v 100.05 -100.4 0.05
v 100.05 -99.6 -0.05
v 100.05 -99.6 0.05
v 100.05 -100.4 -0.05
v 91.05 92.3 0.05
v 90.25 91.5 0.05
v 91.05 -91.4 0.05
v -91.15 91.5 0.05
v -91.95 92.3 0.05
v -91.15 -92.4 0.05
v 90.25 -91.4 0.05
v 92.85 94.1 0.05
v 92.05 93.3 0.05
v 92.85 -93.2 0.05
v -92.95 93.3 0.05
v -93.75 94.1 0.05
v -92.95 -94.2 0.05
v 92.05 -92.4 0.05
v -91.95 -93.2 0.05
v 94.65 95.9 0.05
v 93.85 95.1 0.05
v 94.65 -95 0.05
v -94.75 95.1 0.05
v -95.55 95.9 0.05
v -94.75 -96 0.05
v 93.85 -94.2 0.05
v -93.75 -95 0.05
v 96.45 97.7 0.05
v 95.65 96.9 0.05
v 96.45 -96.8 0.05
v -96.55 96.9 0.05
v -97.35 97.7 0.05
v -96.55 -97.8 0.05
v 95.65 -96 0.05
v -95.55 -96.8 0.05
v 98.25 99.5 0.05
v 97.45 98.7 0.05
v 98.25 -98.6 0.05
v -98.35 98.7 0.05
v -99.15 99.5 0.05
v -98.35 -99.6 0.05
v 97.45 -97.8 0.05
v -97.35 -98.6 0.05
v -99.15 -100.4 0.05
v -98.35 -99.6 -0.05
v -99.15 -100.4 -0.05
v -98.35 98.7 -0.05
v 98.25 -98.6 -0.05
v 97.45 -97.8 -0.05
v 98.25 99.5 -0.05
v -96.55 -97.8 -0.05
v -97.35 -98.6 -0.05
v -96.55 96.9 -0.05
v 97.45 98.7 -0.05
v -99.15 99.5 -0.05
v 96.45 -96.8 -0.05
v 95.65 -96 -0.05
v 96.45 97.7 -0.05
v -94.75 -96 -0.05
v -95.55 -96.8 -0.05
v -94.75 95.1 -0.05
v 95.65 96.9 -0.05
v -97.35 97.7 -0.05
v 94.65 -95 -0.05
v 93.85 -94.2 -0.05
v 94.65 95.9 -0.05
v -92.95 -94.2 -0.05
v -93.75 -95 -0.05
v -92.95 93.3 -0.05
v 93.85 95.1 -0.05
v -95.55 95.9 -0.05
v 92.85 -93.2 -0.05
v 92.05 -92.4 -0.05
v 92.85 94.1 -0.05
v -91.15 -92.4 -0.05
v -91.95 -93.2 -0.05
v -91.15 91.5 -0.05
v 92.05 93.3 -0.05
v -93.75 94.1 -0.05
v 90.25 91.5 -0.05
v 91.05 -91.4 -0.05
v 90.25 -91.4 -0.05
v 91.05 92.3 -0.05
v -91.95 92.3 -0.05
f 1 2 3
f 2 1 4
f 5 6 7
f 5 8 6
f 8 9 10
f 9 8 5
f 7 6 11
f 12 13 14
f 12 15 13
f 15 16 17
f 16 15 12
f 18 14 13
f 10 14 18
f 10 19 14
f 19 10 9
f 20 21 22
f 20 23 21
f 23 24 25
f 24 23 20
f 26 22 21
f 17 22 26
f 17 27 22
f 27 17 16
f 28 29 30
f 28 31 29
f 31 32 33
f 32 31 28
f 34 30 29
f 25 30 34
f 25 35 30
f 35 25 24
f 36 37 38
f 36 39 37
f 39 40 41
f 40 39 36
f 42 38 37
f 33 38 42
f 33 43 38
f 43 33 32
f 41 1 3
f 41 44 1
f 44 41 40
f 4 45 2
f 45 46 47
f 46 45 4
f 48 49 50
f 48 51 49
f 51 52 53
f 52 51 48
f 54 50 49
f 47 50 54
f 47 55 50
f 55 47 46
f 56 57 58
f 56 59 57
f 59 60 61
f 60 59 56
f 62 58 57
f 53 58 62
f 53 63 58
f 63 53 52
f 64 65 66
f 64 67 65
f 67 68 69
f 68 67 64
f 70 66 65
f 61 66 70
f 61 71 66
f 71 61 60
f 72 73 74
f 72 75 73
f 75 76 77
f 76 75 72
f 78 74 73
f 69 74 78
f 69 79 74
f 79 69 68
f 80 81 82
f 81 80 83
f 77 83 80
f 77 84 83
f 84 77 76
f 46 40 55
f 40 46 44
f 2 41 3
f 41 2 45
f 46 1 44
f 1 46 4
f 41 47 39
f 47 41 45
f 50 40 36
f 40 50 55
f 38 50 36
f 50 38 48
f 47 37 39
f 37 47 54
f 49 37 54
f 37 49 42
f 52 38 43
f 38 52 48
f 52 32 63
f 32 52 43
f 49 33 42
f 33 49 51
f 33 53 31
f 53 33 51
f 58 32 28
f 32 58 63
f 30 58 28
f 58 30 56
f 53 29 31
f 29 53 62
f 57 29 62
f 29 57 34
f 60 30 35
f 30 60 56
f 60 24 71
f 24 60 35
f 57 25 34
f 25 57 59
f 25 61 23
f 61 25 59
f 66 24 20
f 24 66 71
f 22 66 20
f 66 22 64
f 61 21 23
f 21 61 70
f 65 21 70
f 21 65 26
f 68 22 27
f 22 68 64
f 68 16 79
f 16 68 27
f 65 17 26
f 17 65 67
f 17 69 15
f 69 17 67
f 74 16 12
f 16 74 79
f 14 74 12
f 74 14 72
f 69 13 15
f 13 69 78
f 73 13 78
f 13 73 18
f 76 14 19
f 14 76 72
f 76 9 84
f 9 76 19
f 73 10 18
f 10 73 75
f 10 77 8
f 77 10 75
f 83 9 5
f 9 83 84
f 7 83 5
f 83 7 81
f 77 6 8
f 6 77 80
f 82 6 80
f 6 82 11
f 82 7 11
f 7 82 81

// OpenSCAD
// spiral shape (rectangular or circular)
_bed_type = 4; // [4:rectangular, 120:circular]

// width of the bed along the x-axis
_bed_x = 200;

// width of the bed along the y-axis
_bed_y = 200;

// thickness of each printed line of the spiral
_line_width = 0.8;

// height of the spiral
_line_height = 0.1;

// distance between each loop of the spiral
_spiral_gap = 1;

// number of loops in the spiral
_loops = 5;


module make() {
//	#cube([_bed_x, _bed_y, 0.1], center=true);

	if (_bed_type == 4) {
		sqiral(_loops, _bed_x/2, _bed_y/2, _line_width, _line_height, _spiral_gap, _bed_type);
	} else {
		spiral(_loops, min(_bed_x, _bed_y)/2, _line_width, _line_height, _spiral_gap, _bed_type);
	}
}


module sqiral(revolutions, rx, ry, thickness, height, gap, resolution) {
	minr = min(rx, ry);
	revolutions = min(revolutions, floor((minr-gap)/(thickness+gap)));
	rx = rx - thickness;
	pitch = thickness + gap;

	union() {
		for (step = [0:1:revolutions * resolution - 1]) {
			assign(s = step * pitch/4) {
				if (step%2 == 0) {
					translate([(step%4) ? -pitch/4 : pitch/4, (step%4) ? ry - s : -ry + s, 0])
					cube([rx*2 - s*2 + thickness, thickness, height], center=true);
				} else {
					translate([(step%4-1) ? rx - s: -rx + s, (step%4-1) ? pitch/4 : -pitch/4, 0])
					cube([thickness, ry*2 - s*2 + thickness, height], center=true);
				}
			}
		}
	}
}

function spiralRadius(radius, angle, pitch) = radius - pitch * (angle/360);
function angleStep(step) = step * (360/_bed_type);

module spiral(revolutions, radius, thickness, height, gap, resolution) {
	revolutions = min(revolutions, floor((radius-gap)/(thickness+gap)));
	pitch = thickness + gap;
	eps = 0.01;

	union() {
		for (step = [0:1:revolutions * resolution-1]) {
			assign(startAngle = angleStep(step),
					endAngle = angleStep(step+1)) {
				assign(	r0 = spiralRadius(radius, startAngle, pitch),
						r1 = spiralRadius(radius, endAngle, pitch),
						r2 = spiralRadius(radius-thickness, endAngle, pitch),
						r3 = spiralRadius(radius-thickness, startAngle, pitch) ) {
					linear_extrude(height = height, slices = 1) {
						polygon(	points=[	[r0*sin(startAngle), r0*cos(startAngle)],
										[r1*sin(endAngle), r1*cos(endAngle)],
										[r2*sin(endAngle+eps), r2*cos(endAngle+eps)],
										[r3*sin(startAngle-eps), r3*cos(startAngle-eps)]],
								paths=[[0,1,2,3]]);
					}
				}			
			}
		}
	}
}


make();
